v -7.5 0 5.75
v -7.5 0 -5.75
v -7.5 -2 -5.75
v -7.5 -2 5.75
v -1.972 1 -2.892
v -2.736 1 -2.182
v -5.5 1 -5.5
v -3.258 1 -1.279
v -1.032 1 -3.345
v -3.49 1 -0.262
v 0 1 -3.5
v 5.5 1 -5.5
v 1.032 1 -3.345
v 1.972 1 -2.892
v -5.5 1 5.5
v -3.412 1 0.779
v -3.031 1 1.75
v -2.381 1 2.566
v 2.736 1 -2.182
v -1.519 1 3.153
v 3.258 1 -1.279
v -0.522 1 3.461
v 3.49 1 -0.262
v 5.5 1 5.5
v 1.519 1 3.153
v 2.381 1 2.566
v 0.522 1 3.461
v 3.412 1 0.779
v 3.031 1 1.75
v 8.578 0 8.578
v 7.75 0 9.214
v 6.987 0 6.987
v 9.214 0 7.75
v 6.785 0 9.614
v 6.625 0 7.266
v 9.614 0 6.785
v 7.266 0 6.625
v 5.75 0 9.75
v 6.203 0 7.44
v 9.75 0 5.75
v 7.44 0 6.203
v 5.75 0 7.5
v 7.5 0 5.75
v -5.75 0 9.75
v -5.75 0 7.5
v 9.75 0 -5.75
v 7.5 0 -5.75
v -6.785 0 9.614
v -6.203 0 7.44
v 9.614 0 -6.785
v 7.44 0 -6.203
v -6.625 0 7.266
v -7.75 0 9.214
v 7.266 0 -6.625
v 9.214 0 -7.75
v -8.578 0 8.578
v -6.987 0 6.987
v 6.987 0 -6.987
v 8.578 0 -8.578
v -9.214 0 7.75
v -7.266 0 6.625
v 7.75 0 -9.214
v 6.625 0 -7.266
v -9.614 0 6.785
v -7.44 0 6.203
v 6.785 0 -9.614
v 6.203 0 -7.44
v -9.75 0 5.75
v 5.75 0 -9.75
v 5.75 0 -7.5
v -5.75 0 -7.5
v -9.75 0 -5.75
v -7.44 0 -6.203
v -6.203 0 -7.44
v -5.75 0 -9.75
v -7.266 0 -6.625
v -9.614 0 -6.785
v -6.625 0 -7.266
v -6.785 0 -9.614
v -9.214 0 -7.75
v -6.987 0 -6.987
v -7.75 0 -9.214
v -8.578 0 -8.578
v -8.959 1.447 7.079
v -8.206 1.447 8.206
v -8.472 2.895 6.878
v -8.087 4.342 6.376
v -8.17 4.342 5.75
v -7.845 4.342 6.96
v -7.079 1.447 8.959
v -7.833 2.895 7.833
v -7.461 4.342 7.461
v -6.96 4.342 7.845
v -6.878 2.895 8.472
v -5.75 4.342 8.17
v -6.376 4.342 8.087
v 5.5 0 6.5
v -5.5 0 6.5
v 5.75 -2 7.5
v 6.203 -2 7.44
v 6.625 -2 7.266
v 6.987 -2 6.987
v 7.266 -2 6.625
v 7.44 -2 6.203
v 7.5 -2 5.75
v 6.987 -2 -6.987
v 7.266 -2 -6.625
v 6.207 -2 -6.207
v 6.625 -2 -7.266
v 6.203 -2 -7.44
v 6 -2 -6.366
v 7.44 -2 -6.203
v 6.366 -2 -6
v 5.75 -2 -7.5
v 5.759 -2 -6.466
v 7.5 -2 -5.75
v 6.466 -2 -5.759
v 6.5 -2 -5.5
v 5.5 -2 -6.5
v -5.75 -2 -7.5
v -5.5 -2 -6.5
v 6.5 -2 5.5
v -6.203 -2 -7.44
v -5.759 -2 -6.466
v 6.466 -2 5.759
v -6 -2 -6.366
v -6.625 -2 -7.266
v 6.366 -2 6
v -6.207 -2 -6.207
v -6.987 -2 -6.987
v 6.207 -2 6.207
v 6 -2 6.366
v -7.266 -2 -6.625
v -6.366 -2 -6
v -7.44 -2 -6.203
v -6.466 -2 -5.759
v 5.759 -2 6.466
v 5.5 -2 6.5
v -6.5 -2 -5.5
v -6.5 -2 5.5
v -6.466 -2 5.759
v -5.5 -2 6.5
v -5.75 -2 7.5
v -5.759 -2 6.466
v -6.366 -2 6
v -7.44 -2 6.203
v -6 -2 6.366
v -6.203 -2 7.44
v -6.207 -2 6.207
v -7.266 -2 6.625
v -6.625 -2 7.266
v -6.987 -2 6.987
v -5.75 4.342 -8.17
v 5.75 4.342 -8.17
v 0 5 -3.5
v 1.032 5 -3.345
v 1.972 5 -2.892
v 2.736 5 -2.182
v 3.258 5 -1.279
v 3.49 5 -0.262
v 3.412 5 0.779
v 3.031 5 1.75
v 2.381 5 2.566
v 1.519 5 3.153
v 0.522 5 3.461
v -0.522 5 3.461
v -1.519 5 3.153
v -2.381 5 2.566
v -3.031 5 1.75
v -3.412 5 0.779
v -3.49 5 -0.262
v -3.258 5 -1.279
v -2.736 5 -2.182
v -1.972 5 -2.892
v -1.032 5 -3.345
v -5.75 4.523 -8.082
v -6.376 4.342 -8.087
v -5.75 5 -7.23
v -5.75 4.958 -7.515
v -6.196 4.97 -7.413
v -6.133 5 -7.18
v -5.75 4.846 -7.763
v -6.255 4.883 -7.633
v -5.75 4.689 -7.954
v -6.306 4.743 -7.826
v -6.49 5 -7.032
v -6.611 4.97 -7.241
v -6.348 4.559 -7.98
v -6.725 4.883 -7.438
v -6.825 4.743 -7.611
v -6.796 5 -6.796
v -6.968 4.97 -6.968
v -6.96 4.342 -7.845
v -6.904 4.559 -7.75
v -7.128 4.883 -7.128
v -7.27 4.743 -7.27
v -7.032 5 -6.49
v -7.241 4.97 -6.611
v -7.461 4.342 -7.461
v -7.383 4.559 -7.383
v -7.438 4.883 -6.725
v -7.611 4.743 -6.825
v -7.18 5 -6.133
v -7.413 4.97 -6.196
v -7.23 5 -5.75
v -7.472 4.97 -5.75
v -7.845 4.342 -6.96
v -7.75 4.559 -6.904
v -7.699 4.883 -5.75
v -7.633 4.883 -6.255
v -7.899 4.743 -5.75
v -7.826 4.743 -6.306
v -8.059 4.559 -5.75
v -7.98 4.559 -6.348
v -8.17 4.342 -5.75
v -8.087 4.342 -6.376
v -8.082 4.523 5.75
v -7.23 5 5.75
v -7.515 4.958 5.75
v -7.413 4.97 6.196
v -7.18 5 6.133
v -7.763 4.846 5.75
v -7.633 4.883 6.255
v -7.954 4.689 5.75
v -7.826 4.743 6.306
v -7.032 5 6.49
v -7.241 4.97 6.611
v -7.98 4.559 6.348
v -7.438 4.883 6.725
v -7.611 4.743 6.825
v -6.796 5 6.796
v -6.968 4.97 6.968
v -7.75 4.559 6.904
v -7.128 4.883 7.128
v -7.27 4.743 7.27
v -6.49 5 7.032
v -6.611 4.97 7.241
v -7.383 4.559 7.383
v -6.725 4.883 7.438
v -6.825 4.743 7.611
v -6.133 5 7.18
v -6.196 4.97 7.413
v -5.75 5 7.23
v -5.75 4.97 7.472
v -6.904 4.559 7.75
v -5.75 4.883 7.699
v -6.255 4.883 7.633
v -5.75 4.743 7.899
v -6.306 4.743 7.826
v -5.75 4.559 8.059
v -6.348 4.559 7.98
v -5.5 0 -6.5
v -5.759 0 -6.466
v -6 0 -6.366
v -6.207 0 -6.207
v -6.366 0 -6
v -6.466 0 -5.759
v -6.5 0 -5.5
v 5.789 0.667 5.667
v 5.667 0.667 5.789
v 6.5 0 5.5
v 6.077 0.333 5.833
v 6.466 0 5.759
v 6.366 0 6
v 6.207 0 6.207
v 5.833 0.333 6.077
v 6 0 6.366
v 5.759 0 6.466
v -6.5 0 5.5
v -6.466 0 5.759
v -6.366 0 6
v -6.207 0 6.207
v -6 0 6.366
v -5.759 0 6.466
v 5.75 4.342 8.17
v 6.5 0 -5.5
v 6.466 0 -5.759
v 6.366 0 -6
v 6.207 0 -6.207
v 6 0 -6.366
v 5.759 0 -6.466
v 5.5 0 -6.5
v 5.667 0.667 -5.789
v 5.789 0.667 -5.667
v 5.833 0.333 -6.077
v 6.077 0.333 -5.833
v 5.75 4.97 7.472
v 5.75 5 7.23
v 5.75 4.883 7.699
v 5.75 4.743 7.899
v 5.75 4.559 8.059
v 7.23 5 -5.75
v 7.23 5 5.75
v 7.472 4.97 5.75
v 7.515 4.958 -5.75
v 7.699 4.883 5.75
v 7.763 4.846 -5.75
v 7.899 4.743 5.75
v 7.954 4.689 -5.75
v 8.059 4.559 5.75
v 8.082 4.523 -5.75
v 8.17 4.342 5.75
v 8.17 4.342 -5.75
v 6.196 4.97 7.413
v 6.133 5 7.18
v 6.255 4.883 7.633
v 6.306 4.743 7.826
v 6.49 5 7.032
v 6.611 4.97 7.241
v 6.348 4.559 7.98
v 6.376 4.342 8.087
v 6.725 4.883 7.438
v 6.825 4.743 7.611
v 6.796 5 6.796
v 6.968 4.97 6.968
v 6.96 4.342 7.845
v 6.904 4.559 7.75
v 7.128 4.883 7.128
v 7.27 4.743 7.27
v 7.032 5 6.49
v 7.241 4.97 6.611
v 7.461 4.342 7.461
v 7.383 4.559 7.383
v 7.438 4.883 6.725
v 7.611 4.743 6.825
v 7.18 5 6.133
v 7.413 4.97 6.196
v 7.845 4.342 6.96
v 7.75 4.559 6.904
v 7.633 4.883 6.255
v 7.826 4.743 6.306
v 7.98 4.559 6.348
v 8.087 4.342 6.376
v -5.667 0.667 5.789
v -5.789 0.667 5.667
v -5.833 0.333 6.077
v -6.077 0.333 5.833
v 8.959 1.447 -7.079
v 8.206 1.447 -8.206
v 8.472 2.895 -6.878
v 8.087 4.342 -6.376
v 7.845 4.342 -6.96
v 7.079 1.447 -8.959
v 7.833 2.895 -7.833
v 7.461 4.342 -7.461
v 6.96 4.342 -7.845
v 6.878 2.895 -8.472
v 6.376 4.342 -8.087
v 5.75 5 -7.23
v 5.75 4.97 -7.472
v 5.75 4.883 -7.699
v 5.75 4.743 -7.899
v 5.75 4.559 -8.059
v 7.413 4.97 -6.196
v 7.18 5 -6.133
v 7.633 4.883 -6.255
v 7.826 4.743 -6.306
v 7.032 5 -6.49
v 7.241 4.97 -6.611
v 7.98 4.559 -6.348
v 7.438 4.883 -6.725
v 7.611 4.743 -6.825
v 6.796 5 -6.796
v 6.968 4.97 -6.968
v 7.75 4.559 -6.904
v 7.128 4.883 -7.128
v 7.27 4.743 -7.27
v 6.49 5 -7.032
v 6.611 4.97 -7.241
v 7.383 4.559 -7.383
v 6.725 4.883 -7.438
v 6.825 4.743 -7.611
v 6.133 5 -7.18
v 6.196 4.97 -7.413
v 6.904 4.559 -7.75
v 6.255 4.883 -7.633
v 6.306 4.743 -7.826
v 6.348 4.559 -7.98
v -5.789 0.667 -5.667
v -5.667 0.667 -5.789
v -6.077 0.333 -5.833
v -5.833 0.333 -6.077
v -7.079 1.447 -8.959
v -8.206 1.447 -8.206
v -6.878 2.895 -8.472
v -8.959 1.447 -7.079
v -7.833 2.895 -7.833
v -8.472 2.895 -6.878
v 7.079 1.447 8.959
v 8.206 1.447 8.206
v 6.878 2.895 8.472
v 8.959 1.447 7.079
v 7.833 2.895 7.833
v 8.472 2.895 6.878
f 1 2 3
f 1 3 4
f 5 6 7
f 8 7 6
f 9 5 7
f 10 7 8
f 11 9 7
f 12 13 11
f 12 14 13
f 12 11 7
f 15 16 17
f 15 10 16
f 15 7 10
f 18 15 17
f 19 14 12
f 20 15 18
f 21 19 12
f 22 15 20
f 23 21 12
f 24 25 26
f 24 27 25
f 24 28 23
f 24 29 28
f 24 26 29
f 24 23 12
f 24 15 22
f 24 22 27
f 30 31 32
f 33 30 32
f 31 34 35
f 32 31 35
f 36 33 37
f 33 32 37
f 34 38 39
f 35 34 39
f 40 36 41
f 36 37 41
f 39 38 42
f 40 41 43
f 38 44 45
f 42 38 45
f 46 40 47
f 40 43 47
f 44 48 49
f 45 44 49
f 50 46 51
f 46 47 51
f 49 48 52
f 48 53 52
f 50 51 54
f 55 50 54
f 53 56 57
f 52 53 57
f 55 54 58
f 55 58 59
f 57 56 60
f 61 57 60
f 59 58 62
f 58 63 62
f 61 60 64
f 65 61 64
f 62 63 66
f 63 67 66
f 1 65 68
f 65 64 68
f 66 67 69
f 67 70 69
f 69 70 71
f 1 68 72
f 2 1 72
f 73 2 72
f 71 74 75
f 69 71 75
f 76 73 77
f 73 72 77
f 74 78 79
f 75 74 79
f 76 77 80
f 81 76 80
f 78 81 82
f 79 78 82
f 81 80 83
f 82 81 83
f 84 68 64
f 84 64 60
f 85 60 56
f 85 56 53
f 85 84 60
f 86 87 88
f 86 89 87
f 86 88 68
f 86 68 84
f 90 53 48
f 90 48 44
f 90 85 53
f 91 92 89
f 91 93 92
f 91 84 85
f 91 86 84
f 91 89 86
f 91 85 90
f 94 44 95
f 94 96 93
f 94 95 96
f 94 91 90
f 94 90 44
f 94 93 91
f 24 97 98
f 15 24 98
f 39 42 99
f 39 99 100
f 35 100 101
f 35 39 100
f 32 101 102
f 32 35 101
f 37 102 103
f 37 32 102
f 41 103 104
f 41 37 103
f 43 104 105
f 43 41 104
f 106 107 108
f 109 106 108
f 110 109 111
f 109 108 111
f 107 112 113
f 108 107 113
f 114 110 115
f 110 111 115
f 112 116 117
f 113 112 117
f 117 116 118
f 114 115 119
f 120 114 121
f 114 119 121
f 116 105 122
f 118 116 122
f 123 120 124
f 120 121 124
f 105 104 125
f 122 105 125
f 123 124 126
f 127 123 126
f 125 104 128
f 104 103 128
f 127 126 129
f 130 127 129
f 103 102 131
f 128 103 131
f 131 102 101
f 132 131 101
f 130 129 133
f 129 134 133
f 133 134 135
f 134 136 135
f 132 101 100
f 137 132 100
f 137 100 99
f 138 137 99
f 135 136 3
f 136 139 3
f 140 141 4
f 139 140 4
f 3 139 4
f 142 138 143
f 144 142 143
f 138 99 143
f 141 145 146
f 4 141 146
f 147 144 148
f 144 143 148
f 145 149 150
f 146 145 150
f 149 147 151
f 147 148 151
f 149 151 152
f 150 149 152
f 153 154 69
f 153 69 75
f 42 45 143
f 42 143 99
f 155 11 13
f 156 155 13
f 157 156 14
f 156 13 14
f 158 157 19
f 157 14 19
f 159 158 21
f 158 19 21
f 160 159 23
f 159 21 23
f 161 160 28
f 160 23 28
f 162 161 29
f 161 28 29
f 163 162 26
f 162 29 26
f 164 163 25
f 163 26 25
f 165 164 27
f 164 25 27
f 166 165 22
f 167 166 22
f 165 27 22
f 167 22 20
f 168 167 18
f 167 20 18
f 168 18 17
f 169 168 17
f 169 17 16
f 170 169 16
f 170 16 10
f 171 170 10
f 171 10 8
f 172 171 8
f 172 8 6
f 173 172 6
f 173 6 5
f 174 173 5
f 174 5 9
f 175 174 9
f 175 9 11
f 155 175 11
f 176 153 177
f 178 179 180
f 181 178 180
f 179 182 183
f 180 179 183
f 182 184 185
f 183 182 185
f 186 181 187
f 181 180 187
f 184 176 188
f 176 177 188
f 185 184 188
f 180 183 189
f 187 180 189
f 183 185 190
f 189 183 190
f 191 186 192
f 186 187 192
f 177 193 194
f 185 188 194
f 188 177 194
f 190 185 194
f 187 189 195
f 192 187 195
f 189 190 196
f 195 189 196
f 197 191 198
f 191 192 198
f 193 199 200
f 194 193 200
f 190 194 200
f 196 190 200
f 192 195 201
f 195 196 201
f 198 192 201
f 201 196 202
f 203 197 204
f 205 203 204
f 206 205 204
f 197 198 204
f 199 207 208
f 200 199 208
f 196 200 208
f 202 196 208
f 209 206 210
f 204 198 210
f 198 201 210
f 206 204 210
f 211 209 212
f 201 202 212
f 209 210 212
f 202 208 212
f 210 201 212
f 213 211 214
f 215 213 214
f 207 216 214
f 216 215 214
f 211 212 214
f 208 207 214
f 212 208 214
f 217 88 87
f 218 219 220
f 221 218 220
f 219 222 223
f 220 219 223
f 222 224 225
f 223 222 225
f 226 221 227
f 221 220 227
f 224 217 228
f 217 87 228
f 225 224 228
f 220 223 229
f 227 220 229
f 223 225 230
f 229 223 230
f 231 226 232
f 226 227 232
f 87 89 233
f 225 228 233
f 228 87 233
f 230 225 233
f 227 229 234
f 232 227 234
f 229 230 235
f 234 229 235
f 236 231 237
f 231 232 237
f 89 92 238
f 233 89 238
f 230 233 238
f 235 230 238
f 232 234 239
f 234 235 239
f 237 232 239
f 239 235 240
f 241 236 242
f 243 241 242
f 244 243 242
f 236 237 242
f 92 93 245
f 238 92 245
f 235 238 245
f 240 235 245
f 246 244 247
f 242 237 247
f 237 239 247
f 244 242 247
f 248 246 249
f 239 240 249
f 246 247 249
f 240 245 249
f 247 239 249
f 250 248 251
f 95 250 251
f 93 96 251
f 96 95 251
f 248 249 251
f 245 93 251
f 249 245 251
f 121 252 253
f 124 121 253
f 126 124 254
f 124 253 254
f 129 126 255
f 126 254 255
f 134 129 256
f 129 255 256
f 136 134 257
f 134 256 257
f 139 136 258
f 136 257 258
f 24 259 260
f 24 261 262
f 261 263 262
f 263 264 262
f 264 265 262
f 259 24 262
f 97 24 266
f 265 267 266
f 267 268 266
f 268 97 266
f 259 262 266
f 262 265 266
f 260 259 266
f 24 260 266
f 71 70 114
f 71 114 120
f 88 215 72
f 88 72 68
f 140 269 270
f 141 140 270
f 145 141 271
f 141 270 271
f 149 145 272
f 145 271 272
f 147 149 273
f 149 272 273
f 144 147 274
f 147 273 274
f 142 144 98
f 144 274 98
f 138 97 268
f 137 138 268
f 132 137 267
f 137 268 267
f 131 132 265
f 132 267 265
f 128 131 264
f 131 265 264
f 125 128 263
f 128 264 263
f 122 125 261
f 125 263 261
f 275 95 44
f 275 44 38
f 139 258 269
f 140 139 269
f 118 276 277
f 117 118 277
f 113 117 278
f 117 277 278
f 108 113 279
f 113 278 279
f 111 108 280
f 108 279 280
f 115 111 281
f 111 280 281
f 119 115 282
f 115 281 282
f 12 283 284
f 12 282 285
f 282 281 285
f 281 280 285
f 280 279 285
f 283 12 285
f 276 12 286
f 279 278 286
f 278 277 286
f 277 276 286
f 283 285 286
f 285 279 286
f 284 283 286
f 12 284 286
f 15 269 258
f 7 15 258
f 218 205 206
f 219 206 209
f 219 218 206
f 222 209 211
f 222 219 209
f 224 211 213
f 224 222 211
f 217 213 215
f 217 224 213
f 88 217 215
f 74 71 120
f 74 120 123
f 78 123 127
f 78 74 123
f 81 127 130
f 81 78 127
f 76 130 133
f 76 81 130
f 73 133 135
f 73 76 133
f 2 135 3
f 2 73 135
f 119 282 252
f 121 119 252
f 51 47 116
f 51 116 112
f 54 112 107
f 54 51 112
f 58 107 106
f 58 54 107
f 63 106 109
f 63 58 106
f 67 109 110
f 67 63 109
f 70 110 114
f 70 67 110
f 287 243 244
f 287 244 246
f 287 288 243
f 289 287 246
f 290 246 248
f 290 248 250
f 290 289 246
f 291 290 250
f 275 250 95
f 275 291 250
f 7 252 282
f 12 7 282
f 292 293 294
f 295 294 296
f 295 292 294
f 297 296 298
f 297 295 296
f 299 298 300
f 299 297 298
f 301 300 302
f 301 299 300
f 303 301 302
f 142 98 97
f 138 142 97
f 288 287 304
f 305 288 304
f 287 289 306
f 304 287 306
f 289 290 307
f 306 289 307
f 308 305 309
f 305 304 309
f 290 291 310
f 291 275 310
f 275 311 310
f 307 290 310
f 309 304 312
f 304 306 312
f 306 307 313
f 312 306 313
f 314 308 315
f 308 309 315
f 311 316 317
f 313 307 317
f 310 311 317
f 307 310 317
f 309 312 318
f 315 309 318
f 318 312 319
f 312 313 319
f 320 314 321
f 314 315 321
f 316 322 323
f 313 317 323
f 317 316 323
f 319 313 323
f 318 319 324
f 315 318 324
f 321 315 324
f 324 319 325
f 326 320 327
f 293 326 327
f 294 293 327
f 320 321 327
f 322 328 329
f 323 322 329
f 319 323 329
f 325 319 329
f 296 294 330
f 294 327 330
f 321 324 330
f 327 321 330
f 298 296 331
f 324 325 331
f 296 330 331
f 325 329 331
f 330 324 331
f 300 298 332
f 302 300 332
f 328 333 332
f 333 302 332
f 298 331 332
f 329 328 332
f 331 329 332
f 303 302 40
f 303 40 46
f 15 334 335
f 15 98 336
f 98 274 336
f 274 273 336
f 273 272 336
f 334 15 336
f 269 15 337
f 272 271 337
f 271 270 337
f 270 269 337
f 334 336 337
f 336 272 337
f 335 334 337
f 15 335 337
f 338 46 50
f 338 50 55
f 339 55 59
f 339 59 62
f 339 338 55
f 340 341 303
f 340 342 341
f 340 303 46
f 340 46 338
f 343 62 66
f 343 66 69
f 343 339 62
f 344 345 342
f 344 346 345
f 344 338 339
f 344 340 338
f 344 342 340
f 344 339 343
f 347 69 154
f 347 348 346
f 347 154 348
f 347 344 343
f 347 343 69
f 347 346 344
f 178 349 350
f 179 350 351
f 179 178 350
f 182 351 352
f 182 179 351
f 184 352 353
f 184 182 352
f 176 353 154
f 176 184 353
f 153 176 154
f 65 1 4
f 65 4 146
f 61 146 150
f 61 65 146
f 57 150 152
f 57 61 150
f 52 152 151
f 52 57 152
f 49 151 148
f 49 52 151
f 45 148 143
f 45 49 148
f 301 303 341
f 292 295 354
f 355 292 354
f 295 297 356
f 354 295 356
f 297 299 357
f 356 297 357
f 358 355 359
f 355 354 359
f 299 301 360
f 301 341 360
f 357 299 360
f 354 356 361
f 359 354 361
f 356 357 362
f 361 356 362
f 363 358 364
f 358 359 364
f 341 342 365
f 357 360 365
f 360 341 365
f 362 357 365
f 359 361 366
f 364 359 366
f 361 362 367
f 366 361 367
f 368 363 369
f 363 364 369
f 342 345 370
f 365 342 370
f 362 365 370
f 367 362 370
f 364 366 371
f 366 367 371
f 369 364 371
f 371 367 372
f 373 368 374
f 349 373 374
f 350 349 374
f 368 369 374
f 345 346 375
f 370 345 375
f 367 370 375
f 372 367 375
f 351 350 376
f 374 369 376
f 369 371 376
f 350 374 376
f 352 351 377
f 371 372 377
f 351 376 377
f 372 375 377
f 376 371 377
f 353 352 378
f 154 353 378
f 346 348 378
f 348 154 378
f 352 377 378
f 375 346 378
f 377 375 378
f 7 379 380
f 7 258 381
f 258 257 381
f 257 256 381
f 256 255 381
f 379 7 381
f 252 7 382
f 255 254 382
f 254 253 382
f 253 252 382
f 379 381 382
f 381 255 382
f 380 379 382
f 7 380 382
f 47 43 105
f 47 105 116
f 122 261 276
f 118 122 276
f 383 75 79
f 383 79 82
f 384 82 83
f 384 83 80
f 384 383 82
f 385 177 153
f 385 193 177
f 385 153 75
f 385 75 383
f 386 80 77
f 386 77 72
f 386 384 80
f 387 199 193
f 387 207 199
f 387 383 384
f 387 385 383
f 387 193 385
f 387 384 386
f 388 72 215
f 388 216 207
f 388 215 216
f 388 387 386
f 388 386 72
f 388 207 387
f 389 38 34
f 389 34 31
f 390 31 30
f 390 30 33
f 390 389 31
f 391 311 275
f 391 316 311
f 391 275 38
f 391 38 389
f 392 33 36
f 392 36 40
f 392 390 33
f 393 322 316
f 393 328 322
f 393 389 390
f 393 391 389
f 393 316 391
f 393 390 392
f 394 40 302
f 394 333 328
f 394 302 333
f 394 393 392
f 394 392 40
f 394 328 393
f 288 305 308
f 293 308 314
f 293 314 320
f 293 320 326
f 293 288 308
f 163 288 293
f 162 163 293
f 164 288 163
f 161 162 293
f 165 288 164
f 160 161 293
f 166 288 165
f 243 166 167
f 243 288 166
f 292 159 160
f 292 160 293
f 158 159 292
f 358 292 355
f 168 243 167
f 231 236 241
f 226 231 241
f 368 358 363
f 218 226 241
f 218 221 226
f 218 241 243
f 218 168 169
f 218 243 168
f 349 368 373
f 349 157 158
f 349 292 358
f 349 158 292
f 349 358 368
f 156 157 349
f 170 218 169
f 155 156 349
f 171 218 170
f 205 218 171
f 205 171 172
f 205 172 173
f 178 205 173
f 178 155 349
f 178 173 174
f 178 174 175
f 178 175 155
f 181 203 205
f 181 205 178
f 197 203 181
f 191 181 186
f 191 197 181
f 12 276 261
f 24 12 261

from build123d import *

# Parameters (mm, degrees)
BOSS_EXTRUDE1_DEPTH = 5
BOSS_EXTRUDE1_TAPER = 20
BOSS_EXTRUDE2_DEPTH = 2
CUT_EXTRUDE1_START  = -1
CUT_EXTRUDE1_DEPTH  = 1
CHAMFER1_SIZE       = 1
CUT_EXTRUDE2_REACH  = 16.357
SKETCH4_R           = 3.5
FILLET1_R           = 1


with BuildPart() as part:
    # Sketch1 → Boss-Extrude1 (new body)
    with BuildSketch(Plane(origin=(0, 0, 0), x_dir=(1, 0, 0), z_dir=(0, 1, 0))):
        with BuildLine():
            ThreePointArc((-5.75, 9.75), (-8.578427125, 8.578427125), (-9.75, 5.75))
            Line((-9.75, 5.75), (-9.75, -5.75))
            ThreePointArc((-9.75, -5.75), (-8.578427125, -8.578427125), (-5.75, -9.75))
            Line((-5.75, -9.75), (5.75, -9.75))
            ThreePointArc((5.75, -9.75), (8.578427125, -8.578427125), (9.75, -5.75))
            Line((9.75, -5.75), (9.75, 5.75))
            ThreePointArc((9.75, 5.75), (8.578427125, 8.578427125), (5.75, 9.75))
            Line((5.75, 9.75), (-5.75, 9.75))
        make_face()
    extrude(amount=BOSS_EXTRUDE1_DEPTH, taper=BOSS_EXTRUDE1_TAPER)

    # Sketch2 → Boss-Extrude2 (add)
    with BuildSketch(Plane.XZ):
        with BuildLine():
            Line((-5.75, 7.5), (5.75, 7.5))
            ThreePointArc((5.75, 7.5), (6.987436867, 6.987436867), (7.5, 5.75))
            Line((7.5, 5.75), (7.5, -5.75))
            ThreePointArc((7.5, -5.75), (6.987436867, -6.987436867), (5.75, -7.5))
            Line((5.75, -7.5), (-5.75, -7.5))
            ThreePointArc((-5.75, -7.5), (-6.987436867, -6.987436867), (-7.5, -5.75))
            Line((-7.5, -5.75), (-7.5, 5.75))
            ThreePointArc((-7.5, 5.75), (-6.987436867, 6.987436867), (-5.75, 7.5))
        make_face()
        with BuildLine():
            Line((-5.5, 6.5), (5.5, 6.5))
            ThreePointArc((5.5, 6.5), (6.207106781, 6.207106781), (6.5, 5.5))
            Line((6.5, 5.5), (6.5, -5.5))
            ThreePointArc((6.5, -5.5), (6.207106781, -6.207106781), (5.5, -6.5))
            Line((5.5, -6.5), (-5.5, -6.5))
            ThreePointArc((-5.5, -6.5), (-6.207106781, -6.207106781), (-6.5, -5.5))
            Line((-6.5, -5.5), (-6.5, 5.5))
            ThreePointArc((-6.5, 5.5), (-6.207106781, 6.207106781), (-5.5, 6.5))
        make_face(mode=Mode.SUBTRACT)
    extrude(amount=BOSS_EXTRUDE2_DEPTH)

    # Sketch3 → Cut-Extrude1 (cut)
    with BuildSketch(Plane.XZ.offset(CUT_EXTRUDE1_START)):
        with BuildLine():
            Line((5.5, 6.5), (-5.5, 6.5))
            ThreePointArc((-5.5, 6.5), (-6.207106781, 6.207106781), (-6.5, 5.5))
            Line((-6.5, 5.5), (-6.5, -5.5))
            ThreePointArc((-6.5, -5.5), (-6.207106781, -6.207106781), (-5.5, -6.5))
            Line((-5.5, -6.5), (5.5, -6.5))
            ThreePointArc((5.5, -6.5), (6.207106781, -6.207106781), (6.5, -5.5))
            Line((6.5, -5.5), (6.5, 5.5))
            ThreePointArc((6.5, 5.5), (6.207106781, 6.207106781), (5.5, 6.5))
        make_face()
    extrude(amount=CUT_EXTRUDE1_DEPTH, mode=Mode.SUBTRACT)

    # Chamfer1
    chamfer1_edges = [part.edges().sort_by_distance(p)[0] for p in [
        (6.207106781, 1, 6.207106781),
        (6.5, 1, 0),
        (6.207106781, 1, -6.207106781),
        (0, 1, -6.5),
        (-6.207106781, 1, -6.207106781),
        (-6.5, 1, 0),
        (-6.207106781, 1, 6.207106781),
        (0, 1, 6.5),
    ]]
    chamfer(chamfer1_edges, length=CHAMFER1_SIZE - 0.0001)  # a hair under: the kernel refuses the full size

    # Sketch4 → Cut-Extrude2 (cut, up to next)
    with BuildSketch(Plane.XZ.offset(-1), mode=Mode.PRIVATE) as cut_extrude2_sk1:
        with Locations(Location((0, 0, 0), (0, 0, 270))):
            Circle(SKETCH4_R)
    cut_extrude2_tool1 = extrude(cut_extrude2_sk1.sketch, amount=-CUT_EXTRUDE2_REACH, mode=Mode.PRIVATE) & part.part
    add(cut_extrude2_tool1.solids().sort_by_distance((0, 1, 0))[0], mode=Mode.SUBTRACT)

    # Fillet1
    fillet1_edges = [part.edges().sort_by_distance(p)[0] for p in [
        (7.291598021, 5, 7.291598021),
        (7.930148829, 5, 0),
        (7.291598021, 5, -7.291598021),
        (0, 5, -7.930148829),
        (-7.291598021, 5, -7.291598021),
        (-7.930148829, 5, 0),
        (-7.291598021, 5, 7.291598021),
        (0, 5, 7.930148829),
    ]]
    fillet(fillet1_edges, radius=FILLET1_R)


solid = part.part
